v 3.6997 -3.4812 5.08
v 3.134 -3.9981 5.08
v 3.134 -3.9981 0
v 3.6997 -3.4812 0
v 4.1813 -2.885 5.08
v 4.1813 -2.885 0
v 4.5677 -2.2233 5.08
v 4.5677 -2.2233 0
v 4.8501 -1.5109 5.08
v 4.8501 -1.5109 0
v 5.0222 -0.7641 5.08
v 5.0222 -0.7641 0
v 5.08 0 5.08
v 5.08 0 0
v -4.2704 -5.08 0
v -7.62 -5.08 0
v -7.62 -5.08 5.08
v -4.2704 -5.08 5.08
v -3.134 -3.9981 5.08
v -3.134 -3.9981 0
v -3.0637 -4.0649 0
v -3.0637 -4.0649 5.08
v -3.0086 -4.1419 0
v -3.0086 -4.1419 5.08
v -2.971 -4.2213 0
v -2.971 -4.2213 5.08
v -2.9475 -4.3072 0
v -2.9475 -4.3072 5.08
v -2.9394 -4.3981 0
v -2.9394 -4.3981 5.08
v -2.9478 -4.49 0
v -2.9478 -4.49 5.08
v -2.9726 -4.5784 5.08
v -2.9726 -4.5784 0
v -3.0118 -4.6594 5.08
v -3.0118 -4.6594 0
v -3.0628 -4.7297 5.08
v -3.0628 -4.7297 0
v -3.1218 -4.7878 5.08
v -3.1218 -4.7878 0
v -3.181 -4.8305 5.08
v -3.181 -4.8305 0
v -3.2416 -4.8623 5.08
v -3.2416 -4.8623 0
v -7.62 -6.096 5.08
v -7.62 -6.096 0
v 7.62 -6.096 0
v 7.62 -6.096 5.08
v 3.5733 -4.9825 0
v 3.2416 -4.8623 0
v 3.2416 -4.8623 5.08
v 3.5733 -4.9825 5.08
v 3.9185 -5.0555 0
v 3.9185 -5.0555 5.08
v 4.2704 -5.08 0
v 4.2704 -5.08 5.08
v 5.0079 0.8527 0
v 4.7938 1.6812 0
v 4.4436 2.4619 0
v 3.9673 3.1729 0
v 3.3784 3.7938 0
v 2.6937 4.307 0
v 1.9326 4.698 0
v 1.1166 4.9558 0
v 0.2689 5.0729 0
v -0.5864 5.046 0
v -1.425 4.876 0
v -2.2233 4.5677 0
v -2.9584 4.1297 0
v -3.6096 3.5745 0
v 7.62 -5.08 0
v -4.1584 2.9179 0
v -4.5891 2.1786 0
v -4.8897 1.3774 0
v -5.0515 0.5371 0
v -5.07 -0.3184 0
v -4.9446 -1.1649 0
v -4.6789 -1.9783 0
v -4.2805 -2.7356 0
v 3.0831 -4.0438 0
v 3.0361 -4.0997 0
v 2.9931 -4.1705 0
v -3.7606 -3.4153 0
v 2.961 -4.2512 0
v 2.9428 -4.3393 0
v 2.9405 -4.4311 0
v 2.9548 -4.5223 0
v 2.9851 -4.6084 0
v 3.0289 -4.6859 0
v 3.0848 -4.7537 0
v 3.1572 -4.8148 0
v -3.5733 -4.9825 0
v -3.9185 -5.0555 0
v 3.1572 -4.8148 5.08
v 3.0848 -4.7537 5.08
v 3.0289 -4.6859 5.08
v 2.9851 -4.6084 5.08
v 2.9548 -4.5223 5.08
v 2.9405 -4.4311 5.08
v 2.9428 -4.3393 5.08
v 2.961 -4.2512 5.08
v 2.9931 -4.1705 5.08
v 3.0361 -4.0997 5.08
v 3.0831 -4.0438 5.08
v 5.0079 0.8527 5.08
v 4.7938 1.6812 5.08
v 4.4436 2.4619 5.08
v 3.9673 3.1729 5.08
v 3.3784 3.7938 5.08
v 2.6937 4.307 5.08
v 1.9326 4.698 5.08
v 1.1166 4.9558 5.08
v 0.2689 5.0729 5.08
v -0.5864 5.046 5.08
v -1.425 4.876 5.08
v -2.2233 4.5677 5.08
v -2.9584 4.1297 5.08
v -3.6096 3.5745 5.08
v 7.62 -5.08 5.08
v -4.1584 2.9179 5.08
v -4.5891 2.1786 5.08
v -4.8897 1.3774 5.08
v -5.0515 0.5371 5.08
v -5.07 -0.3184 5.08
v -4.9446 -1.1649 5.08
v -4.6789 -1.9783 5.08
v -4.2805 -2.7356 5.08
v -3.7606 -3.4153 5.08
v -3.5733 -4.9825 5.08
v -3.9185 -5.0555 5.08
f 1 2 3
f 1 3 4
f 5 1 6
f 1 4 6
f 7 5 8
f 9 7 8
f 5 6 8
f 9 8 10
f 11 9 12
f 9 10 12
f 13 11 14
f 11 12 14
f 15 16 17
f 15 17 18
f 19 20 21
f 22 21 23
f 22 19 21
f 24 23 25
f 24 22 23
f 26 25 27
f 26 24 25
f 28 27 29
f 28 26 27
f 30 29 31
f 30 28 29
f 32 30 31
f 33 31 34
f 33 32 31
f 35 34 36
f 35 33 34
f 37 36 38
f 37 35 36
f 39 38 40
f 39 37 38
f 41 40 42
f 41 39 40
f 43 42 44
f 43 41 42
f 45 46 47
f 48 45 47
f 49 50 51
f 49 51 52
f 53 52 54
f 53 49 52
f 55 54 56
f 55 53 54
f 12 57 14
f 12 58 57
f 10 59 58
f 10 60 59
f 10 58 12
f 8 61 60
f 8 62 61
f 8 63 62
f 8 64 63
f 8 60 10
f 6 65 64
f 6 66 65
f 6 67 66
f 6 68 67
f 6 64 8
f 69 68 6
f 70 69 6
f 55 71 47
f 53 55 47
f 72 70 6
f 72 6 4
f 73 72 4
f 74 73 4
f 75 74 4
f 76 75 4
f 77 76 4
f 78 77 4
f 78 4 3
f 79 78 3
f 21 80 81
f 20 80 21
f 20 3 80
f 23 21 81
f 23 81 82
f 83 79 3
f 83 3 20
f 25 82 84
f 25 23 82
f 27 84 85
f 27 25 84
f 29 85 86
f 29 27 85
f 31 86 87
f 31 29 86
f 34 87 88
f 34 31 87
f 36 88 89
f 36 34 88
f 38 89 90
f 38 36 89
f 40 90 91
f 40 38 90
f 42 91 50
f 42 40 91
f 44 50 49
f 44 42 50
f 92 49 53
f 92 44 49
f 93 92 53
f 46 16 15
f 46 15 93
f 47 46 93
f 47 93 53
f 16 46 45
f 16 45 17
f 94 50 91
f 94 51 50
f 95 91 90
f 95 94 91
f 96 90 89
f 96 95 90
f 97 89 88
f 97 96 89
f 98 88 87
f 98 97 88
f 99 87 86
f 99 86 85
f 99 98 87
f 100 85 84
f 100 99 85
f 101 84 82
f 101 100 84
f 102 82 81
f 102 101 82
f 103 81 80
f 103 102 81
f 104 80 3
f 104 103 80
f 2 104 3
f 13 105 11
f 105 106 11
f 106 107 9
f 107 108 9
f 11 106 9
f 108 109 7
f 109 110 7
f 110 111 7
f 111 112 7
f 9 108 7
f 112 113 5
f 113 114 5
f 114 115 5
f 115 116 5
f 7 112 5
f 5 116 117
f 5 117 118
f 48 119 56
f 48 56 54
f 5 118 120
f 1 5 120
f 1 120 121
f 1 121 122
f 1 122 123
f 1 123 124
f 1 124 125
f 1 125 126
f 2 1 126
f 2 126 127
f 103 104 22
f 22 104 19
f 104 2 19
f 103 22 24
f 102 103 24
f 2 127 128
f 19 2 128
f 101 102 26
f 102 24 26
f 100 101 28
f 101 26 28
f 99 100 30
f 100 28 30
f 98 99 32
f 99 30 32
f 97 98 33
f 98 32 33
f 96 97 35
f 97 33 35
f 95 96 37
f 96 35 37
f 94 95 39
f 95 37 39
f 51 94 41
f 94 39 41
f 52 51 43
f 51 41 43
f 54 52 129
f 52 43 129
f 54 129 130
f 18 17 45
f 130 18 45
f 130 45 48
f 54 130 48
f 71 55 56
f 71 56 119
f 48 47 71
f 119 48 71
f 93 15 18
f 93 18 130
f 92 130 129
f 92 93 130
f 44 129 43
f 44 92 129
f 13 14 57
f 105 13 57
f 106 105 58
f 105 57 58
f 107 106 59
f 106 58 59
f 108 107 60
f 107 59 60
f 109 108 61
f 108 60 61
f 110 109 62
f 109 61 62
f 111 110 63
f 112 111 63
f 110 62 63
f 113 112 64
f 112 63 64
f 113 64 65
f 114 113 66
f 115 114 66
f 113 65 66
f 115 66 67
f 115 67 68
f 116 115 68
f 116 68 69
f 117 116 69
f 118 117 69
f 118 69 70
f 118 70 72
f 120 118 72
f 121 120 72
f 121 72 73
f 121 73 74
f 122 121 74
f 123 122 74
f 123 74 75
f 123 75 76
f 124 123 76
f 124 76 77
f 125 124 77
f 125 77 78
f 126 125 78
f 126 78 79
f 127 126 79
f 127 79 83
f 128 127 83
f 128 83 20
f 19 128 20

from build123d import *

# Parameters (mm, degrees)
SKETCH1_W           = 2.54
SKETCH1_H           = 1.016
SKETCH1_W_2         = 5.08
BOSS_EXTRUDE1_DEPTH = 5.08
FILLET1_R           = 2.54
FILLET2_R           = 0.508


with BuildPart() as part:
    # Sketch1 → Boss-Extrude1 (new body)
    with BuildSketch(Plane.XY):
        with BuildLine():
            Line((-2.54, -4.399409051), (-2.54, -1.651))
            Line((-2.54, -1.651), (2.54, -1.651))
            Line((2.54, -1.651), (2.54, -4.399409051))
            ThreePointArc((2.54, -4.399409051), (4.399409051, -2.54), (5.08, 0))
            ThreePointArc((5.08, 0), (-2.54, 4.399409051), (-2.54, -4.399409051))
        make_face()
        with BuildLine():
            Line((2.54, -1.651), (-2.54, -1.651))
            Line((-2.54, -1.651), (-2.54, -4.399409051))
            ThreePointArc((-2.54, -4.399409051), (-1.314800749, -4.906903198), (0, -5.08))
            ThreePointArc((0, -5.08), (1.314800749, -4.906903198), (2.54, -4.399409051))
            Line((2.54, -4.399409051), (2.54, -1.651))
        make_face()
        with BuildLine():
            Line((-2.54, -4.399409051), (-2.54, -1.651))
            Line((-2.54, -1.651), (2.54, -1.651))
            Line((2.54, -1.651), (2.54, -4.399409051))
            ThreePointArc((2.54, -4.399409051), (4.399409051, -2.54), (5.08, 0))
            ThreePointArc((5.08, 0), (-2.54, 4.399409051), (-2.54, -4.399409051))
        make_face()
        with BuildLine():
            Line((2.54, -1.651), (-2.54, -1.651))
            Line((-2.54, -1.651), (-2.54, -4.399409051))
            ThreePointArc((-2.54, -4.399409051), (-1.314800749, -4.906903198), (0, -5.08))
            ThreePointArc((0, -5.08), (1.314800749, -4.906903198), (2.54, -4.399409051))
            Line((2.54, -4.399409051), (2.54, -1.651))
        make_face()
        with BuildLine():
            ThreePointArc((0, -5.08), (-1.314800749, -4.906903198), (-2.54, -4.399409051))
            Line((-2.54, -4.399409051), (-2.54, -5.08))
            Line((-2.54, -5.08), (0, -5.08))
        make_face()
        with BuildLine():
            Line((2.54, -5.08), (2.54, -4.399409051))
            ThreePointArc((2.54, -4.399409051), (1.314800749, -4.906903198), (0, -5.08))
            Line((0, -5.08), (2.54, -5.08))
        make_face()
        with Locations((1.27, -5.588)):
            Rectangle(SKETCH1_W, SKETCH1_H)
        with Locations((-5.08, -5.588)):
            Rectangle(SKETCH1_W_2, SKETCH1_H)
        with Locations((5.08, -5.588)):
            Rectangle(SKETCH1_W_2, SKETCH1_H)
        with Locations((-1.27, -5.588)):
            Rectangle(SKETCH1_W, SKETCH1_H)
    extrude(amount=BOSS_EXTRUDE1_DEPTH)

    # Fillet1
    # the kernel refuses this fillet: 2.54 mm, written as the material it adds along each edge
    with BuildSketch(Plane(origin=(-2.54, -5.08, 0), x_dir=(-1, 0, 0), z_dir=(0, 0, 1))) as fillet1_piece_1:
        with BuildLine():
            CenterArc((1.730375098, -2.54), FILLET1_R, 90, 42.941402865)
            Line((0, -0.680590949), (-0.034607502, -0.643402768))
            ThreePointArc((-0.034607502, -0.643402768), (-0.0508, -0.340295474), (-0.0508, 0))
            Line((-0.0508, 0), (0, 0.0508))
            Line((0, 0.0508), (1.730375098, 0.0508))
            Line((1.730375098, 0.0508), (1.730375098, 0))
        make_face()
    extrude(amount=5.08)
    with BuildSketch(Plane(origin=(2.54, -5.08, 0), x_dir=(0, 1, 0), z_dir=(0, 0, 1))) as fillet1_piece_2:
        with BuildLine():
            CenterArc((2.54, -1.730375098), FILLET1_R, 137.058597135, 42.941402865)
            Line((0, -1.730375098), (-0.0508, -1.730375098))
            Line((-0.0508, -1.730375098), (-0.0508, 0))
            Line((-0.0508, 0), (0, 0.0508))
            ThreePointArc((0, 0.0508), (0.340295474, 0.0508), (0.643402768, 0.034607502))
            Line((0.643402768, 0.034607502), (0.680590949, 0))
        make_face()
    extrude(amount=5.08)

    # Fillet2
    fillet2_edges = [part.edges().sort_by_distance(p)[0] for p in [
        (2.54, -4.399409051, 2.54),
        (-2.54, -4.399409051, 2.54),
    ]]
    fillet(fillet2_edges, radius=FILLET2_R)


solid = part.part
